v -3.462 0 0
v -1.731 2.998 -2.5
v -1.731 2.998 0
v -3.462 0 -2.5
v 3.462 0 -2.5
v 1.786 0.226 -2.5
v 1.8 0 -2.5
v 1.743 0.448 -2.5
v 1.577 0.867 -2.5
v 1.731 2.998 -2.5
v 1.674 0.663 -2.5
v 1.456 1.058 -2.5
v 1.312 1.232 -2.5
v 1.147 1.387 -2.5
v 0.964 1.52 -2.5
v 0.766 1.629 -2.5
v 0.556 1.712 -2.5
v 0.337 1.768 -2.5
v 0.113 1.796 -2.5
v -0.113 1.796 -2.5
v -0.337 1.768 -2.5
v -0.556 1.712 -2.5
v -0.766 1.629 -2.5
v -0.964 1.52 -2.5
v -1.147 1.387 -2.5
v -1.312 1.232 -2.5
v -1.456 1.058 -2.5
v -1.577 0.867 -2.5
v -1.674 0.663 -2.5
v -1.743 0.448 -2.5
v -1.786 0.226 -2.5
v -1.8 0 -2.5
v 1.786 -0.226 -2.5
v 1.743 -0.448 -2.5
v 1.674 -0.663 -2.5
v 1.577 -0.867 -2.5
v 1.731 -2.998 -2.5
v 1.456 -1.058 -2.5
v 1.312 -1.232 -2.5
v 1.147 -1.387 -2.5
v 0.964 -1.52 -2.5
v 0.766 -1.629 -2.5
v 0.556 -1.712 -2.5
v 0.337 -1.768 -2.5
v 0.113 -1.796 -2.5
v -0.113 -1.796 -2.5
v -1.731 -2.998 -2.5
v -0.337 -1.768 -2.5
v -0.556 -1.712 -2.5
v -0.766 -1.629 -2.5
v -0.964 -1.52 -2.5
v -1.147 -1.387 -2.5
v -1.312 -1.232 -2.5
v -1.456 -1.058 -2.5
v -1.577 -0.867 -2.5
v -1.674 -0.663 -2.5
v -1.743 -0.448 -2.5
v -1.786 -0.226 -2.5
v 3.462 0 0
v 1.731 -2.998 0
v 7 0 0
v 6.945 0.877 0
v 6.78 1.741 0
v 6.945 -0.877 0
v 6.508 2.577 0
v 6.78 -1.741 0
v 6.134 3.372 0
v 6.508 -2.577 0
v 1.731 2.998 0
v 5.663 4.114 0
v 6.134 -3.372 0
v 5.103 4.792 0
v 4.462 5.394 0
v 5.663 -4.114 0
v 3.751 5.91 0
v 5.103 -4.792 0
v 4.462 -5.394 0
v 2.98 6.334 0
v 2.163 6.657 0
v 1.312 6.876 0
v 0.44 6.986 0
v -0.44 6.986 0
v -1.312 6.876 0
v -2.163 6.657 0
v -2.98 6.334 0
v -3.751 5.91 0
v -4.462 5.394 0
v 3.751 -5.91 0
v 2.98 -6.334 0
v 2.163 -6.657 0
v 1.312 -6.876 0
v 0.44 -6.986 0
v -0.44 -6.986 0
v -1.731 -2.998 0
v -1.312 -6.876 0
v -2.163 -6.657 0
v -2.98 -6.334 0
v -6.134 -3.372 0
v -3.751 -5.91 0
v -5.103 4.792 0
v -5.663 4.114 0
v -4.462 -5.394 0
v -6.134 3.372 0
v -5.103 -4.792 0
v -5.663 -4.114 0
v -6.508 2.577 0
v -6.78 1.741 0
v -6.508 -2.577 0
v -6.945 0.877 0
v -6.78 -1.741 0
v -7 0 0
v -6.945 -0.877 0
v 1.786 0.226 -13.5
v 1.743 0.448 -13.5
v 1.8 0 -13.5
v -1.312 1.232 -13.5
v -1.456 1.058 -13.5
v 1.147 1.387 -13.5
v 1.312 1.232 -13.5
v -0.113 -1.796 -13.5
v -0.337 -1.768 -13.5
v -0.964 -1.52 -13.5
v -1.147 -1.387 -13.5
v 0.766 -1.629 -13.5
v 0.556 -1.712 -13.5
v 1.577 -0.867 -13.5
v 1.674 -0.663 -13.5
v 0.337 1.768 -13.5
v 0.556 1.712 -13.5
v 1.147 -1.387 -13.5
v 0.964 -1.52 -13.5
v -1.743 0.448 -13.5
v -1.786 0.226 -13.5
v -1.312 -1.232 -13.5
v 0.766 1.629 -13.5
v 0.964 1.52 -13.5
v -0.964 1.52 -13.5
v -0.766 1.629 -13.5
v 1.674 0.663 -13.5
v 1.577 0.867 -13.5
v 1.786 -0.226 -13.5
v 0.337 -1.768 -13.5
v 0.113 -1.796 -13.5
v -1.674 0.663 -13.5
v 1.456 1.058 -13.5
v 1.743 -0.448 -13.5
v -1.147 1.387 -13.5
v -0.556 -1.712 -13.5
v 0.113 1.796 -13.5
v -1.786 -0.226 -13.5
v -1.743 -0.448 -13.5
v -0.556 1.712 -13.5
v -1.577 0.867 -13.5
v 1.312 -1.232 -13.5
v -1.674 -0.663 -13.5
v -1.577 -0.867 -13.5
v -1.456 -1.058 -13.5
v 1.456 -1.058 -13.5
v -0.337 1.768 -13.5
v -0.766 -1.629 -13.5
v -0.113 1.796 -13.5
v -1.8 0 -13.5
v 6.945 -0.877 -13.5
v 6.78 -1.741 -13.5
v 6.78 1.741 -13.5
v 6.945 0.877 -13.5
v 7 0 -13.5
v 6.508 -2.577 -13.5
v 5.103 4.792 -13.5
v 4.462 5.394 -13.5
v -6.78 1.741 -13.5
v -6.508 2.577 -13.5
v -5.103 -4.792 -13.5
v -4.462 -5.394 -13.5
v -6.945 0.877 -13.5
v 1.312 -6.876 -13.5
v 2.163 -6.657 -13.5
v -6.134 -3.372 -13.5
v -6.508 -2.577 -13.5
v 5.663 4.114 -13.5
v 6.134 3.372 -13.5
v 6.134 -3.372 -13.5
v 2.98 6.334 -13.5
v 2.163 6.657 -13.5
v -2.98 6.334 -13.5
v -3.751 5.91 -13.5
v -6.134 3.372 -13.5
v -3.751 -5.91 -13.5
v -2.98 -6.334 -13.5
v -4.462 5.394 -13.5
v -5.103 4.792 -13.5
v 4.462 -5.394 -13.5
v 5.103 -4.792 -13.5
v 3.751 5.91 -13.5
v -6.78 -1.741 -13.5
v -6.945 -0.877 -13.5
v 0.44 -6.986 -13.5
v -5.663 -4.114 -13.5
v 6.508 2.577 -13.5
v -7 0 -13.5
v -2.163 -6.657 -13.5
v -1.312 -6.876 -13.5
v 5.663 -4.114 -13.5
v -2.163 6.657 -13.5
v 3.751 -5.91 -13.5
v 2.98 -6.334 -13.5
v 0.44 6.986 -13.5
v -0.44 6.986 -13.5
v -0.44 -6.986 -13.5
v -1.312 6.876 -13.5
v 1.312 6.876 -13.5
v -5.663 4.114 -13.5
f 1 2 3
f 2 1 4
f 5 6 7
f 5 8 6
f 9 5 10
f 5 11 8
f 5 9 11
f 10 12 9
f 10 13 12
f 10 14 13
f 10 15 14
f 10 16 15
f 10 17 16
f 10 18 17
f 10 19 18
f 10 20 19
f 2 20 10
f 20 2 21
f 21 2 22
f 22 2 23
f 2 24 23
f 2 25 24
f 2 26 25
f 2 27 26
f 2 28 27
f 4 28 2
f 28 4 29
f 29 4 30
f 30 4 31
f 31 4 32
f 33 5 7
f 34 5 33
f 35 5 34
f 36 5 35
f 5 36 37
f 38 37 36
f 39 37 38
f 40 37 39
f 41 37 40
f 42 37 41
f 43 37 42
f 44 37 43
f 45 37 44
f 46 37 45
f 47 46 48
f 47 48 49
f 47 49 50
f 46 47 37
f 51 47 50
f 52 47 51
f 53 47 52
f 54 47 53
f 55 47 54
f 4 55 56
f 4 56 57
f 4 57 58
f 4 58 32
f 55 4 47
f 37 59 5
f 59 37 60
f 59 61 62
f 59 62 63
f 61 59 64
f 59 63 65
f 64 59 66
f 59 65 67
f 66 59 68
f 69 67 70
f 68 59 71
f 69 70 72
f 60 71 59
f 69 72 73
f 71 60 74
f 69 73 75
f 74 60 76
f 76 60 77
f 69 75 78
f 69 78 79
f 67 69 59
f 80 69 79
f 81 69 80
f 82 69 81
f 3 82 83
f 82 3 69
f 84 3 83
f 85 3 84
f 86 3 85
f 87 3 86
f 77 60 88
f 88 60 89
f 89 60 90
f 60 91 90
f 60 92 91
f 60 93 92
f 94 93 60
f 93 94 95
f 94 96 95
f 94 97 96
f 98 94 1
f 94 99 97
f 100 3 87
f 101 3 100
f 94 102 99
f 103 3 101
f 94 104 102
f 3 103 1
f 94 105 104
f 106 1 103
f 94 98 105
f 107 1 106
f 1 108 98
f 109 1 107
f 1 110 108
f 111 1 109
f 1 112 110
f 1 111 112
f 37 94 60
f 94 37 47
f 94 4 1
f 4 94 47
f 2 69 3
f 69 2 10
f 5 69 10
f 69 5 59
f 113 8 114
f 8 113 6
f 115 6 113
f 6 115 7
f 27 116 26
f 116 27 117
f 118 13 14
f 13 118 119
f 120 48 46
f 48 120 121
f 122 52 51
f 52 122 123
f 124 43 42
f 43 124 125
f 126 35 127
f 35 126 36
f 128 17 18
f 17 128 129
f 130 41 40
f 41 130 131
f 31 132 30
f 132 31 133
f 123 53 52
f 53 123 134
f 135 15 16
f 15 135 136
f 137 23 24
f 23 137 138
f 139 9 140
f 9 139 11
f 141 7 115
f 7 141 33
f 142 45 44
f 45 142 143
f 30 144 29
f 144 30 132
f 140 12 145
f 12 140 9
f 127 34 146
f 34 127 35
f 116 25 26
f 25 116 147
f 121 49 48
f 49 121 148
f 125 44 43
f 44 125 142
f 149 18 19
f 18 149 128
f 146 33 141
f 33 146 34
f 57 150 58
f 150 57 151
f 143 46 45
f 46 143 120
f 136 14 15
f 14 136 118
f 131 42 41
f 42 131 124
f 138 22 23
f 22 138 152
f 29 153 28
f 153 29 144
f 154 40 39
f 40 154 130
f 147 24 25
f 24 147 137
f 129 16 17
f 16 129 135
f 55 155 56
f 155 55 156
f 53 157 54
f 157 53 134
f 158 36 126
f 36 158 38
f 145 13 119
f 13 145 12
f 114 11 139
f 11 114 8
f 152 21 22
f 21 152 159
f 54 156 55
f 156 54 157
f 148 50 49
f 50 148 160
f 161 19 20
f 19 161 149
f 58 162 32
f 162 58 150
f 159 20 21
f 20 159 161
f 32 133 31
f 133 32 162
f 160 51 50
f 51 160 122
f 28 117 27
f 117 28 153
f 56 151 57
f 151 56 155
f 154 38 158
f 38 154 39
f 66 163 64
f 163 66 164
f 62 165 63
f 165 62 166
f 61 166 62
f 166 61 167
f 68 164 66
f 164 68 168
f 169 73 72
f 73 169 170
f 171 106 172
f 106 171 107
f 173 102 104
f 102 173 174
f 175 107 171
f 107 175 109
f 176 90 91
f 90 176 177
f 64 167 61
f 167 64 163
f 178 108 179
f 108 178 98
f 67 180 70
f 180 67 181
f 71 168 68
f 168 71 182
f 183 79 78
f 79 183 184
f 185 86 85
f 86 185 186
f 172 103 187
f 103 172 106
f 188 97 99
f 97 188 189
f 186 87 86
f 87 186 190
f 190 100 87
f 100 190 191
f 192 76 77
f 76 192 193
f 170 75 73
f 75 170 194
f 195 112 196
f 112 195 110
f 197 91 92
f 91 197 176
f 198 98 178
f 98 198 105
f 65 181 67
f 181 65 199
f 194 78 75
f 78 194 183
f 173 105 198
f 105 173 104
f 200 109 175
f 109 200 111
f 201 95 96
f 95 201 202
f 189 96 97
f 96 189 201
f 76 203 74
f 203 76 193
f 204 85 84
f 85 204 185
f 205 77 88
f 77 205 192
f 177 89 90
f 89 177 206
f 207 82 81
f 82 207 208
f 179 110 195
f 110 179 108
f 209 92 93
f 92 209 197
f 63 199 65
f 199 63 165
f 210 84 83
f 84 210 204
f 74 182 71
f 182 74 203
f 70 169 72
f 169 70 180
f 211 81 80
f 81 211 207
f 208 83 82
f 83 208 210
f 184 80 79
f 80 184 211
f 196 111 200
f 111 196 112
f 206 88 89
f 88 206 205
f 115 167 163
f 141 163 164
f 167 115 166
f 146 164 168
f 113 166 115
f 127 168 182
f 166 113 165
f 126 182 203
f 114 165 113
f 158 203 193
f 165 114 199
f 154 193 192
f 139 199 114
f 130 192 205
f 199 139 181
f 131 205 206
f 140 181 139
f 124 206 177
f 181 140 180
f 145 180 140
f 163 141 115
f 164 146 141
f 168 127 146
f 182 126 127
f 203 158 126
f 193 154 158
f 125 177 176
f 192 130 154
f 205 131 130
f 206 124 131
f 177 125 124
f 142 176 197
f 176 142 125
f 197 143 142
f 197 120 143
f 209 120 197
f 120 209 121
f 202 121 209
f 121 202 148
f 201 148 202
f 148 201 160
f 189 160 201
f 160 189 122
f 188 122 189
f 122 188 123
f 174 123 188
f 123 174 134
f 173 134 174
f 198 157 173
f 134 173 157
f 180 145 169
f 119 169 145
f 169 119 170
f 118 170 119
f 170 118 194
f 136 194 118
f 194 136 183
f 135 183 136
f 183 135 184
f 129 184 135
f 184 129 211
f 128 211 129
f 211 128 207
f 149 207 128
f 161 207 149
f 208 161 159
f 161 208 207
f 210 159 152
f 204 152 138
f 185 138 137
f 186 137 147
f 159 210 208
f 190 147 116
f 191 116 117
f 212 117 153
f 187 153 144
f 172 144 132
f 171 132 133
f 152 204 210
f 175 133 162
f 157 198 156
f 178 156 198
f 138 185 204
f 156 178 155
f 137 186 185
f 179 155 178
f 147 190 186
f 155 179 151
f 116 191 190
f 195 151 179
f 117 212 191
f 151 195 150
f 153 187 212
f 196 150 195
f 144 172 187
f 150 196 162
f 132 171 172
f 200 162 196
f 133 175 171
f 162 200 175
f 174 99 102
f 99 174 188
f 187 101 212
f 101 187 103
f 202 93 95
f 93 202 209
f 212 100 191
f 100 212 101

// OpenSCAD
$fn = 50;

difference() {
	union() {
		translate(v = [0, 0, -13.5]) {
			cylinder(h = 13.5, r = 7.0);
		}
	}
	union() {
		translate(v = [0, 0, 0]) {
			rotate(a = [0, 0, 0]) {
				difference() {
					union() {
						translate(v = [0, 0, -2.5]) {
							linear_extrude(height = 2.5) {
								polygon(points = [[3.4619999999999997, 0.0], [1.7310000000000003, 2.9981799479017264], [-1.7309999999999992, 2.9981799479017264], [-3.4619999999999997, 4.2397272186481365e-16], [-1.7310000000000014, -2.998179947901726], [1.7309999999999977, -2.9981799479017277]]);
							}
						}
					}
					union();
				}
			}
		}
		#translate(v = [0, 0, -100.0]) {
			cylinder(h = 200, r = 1.8);
		}
	}
}
